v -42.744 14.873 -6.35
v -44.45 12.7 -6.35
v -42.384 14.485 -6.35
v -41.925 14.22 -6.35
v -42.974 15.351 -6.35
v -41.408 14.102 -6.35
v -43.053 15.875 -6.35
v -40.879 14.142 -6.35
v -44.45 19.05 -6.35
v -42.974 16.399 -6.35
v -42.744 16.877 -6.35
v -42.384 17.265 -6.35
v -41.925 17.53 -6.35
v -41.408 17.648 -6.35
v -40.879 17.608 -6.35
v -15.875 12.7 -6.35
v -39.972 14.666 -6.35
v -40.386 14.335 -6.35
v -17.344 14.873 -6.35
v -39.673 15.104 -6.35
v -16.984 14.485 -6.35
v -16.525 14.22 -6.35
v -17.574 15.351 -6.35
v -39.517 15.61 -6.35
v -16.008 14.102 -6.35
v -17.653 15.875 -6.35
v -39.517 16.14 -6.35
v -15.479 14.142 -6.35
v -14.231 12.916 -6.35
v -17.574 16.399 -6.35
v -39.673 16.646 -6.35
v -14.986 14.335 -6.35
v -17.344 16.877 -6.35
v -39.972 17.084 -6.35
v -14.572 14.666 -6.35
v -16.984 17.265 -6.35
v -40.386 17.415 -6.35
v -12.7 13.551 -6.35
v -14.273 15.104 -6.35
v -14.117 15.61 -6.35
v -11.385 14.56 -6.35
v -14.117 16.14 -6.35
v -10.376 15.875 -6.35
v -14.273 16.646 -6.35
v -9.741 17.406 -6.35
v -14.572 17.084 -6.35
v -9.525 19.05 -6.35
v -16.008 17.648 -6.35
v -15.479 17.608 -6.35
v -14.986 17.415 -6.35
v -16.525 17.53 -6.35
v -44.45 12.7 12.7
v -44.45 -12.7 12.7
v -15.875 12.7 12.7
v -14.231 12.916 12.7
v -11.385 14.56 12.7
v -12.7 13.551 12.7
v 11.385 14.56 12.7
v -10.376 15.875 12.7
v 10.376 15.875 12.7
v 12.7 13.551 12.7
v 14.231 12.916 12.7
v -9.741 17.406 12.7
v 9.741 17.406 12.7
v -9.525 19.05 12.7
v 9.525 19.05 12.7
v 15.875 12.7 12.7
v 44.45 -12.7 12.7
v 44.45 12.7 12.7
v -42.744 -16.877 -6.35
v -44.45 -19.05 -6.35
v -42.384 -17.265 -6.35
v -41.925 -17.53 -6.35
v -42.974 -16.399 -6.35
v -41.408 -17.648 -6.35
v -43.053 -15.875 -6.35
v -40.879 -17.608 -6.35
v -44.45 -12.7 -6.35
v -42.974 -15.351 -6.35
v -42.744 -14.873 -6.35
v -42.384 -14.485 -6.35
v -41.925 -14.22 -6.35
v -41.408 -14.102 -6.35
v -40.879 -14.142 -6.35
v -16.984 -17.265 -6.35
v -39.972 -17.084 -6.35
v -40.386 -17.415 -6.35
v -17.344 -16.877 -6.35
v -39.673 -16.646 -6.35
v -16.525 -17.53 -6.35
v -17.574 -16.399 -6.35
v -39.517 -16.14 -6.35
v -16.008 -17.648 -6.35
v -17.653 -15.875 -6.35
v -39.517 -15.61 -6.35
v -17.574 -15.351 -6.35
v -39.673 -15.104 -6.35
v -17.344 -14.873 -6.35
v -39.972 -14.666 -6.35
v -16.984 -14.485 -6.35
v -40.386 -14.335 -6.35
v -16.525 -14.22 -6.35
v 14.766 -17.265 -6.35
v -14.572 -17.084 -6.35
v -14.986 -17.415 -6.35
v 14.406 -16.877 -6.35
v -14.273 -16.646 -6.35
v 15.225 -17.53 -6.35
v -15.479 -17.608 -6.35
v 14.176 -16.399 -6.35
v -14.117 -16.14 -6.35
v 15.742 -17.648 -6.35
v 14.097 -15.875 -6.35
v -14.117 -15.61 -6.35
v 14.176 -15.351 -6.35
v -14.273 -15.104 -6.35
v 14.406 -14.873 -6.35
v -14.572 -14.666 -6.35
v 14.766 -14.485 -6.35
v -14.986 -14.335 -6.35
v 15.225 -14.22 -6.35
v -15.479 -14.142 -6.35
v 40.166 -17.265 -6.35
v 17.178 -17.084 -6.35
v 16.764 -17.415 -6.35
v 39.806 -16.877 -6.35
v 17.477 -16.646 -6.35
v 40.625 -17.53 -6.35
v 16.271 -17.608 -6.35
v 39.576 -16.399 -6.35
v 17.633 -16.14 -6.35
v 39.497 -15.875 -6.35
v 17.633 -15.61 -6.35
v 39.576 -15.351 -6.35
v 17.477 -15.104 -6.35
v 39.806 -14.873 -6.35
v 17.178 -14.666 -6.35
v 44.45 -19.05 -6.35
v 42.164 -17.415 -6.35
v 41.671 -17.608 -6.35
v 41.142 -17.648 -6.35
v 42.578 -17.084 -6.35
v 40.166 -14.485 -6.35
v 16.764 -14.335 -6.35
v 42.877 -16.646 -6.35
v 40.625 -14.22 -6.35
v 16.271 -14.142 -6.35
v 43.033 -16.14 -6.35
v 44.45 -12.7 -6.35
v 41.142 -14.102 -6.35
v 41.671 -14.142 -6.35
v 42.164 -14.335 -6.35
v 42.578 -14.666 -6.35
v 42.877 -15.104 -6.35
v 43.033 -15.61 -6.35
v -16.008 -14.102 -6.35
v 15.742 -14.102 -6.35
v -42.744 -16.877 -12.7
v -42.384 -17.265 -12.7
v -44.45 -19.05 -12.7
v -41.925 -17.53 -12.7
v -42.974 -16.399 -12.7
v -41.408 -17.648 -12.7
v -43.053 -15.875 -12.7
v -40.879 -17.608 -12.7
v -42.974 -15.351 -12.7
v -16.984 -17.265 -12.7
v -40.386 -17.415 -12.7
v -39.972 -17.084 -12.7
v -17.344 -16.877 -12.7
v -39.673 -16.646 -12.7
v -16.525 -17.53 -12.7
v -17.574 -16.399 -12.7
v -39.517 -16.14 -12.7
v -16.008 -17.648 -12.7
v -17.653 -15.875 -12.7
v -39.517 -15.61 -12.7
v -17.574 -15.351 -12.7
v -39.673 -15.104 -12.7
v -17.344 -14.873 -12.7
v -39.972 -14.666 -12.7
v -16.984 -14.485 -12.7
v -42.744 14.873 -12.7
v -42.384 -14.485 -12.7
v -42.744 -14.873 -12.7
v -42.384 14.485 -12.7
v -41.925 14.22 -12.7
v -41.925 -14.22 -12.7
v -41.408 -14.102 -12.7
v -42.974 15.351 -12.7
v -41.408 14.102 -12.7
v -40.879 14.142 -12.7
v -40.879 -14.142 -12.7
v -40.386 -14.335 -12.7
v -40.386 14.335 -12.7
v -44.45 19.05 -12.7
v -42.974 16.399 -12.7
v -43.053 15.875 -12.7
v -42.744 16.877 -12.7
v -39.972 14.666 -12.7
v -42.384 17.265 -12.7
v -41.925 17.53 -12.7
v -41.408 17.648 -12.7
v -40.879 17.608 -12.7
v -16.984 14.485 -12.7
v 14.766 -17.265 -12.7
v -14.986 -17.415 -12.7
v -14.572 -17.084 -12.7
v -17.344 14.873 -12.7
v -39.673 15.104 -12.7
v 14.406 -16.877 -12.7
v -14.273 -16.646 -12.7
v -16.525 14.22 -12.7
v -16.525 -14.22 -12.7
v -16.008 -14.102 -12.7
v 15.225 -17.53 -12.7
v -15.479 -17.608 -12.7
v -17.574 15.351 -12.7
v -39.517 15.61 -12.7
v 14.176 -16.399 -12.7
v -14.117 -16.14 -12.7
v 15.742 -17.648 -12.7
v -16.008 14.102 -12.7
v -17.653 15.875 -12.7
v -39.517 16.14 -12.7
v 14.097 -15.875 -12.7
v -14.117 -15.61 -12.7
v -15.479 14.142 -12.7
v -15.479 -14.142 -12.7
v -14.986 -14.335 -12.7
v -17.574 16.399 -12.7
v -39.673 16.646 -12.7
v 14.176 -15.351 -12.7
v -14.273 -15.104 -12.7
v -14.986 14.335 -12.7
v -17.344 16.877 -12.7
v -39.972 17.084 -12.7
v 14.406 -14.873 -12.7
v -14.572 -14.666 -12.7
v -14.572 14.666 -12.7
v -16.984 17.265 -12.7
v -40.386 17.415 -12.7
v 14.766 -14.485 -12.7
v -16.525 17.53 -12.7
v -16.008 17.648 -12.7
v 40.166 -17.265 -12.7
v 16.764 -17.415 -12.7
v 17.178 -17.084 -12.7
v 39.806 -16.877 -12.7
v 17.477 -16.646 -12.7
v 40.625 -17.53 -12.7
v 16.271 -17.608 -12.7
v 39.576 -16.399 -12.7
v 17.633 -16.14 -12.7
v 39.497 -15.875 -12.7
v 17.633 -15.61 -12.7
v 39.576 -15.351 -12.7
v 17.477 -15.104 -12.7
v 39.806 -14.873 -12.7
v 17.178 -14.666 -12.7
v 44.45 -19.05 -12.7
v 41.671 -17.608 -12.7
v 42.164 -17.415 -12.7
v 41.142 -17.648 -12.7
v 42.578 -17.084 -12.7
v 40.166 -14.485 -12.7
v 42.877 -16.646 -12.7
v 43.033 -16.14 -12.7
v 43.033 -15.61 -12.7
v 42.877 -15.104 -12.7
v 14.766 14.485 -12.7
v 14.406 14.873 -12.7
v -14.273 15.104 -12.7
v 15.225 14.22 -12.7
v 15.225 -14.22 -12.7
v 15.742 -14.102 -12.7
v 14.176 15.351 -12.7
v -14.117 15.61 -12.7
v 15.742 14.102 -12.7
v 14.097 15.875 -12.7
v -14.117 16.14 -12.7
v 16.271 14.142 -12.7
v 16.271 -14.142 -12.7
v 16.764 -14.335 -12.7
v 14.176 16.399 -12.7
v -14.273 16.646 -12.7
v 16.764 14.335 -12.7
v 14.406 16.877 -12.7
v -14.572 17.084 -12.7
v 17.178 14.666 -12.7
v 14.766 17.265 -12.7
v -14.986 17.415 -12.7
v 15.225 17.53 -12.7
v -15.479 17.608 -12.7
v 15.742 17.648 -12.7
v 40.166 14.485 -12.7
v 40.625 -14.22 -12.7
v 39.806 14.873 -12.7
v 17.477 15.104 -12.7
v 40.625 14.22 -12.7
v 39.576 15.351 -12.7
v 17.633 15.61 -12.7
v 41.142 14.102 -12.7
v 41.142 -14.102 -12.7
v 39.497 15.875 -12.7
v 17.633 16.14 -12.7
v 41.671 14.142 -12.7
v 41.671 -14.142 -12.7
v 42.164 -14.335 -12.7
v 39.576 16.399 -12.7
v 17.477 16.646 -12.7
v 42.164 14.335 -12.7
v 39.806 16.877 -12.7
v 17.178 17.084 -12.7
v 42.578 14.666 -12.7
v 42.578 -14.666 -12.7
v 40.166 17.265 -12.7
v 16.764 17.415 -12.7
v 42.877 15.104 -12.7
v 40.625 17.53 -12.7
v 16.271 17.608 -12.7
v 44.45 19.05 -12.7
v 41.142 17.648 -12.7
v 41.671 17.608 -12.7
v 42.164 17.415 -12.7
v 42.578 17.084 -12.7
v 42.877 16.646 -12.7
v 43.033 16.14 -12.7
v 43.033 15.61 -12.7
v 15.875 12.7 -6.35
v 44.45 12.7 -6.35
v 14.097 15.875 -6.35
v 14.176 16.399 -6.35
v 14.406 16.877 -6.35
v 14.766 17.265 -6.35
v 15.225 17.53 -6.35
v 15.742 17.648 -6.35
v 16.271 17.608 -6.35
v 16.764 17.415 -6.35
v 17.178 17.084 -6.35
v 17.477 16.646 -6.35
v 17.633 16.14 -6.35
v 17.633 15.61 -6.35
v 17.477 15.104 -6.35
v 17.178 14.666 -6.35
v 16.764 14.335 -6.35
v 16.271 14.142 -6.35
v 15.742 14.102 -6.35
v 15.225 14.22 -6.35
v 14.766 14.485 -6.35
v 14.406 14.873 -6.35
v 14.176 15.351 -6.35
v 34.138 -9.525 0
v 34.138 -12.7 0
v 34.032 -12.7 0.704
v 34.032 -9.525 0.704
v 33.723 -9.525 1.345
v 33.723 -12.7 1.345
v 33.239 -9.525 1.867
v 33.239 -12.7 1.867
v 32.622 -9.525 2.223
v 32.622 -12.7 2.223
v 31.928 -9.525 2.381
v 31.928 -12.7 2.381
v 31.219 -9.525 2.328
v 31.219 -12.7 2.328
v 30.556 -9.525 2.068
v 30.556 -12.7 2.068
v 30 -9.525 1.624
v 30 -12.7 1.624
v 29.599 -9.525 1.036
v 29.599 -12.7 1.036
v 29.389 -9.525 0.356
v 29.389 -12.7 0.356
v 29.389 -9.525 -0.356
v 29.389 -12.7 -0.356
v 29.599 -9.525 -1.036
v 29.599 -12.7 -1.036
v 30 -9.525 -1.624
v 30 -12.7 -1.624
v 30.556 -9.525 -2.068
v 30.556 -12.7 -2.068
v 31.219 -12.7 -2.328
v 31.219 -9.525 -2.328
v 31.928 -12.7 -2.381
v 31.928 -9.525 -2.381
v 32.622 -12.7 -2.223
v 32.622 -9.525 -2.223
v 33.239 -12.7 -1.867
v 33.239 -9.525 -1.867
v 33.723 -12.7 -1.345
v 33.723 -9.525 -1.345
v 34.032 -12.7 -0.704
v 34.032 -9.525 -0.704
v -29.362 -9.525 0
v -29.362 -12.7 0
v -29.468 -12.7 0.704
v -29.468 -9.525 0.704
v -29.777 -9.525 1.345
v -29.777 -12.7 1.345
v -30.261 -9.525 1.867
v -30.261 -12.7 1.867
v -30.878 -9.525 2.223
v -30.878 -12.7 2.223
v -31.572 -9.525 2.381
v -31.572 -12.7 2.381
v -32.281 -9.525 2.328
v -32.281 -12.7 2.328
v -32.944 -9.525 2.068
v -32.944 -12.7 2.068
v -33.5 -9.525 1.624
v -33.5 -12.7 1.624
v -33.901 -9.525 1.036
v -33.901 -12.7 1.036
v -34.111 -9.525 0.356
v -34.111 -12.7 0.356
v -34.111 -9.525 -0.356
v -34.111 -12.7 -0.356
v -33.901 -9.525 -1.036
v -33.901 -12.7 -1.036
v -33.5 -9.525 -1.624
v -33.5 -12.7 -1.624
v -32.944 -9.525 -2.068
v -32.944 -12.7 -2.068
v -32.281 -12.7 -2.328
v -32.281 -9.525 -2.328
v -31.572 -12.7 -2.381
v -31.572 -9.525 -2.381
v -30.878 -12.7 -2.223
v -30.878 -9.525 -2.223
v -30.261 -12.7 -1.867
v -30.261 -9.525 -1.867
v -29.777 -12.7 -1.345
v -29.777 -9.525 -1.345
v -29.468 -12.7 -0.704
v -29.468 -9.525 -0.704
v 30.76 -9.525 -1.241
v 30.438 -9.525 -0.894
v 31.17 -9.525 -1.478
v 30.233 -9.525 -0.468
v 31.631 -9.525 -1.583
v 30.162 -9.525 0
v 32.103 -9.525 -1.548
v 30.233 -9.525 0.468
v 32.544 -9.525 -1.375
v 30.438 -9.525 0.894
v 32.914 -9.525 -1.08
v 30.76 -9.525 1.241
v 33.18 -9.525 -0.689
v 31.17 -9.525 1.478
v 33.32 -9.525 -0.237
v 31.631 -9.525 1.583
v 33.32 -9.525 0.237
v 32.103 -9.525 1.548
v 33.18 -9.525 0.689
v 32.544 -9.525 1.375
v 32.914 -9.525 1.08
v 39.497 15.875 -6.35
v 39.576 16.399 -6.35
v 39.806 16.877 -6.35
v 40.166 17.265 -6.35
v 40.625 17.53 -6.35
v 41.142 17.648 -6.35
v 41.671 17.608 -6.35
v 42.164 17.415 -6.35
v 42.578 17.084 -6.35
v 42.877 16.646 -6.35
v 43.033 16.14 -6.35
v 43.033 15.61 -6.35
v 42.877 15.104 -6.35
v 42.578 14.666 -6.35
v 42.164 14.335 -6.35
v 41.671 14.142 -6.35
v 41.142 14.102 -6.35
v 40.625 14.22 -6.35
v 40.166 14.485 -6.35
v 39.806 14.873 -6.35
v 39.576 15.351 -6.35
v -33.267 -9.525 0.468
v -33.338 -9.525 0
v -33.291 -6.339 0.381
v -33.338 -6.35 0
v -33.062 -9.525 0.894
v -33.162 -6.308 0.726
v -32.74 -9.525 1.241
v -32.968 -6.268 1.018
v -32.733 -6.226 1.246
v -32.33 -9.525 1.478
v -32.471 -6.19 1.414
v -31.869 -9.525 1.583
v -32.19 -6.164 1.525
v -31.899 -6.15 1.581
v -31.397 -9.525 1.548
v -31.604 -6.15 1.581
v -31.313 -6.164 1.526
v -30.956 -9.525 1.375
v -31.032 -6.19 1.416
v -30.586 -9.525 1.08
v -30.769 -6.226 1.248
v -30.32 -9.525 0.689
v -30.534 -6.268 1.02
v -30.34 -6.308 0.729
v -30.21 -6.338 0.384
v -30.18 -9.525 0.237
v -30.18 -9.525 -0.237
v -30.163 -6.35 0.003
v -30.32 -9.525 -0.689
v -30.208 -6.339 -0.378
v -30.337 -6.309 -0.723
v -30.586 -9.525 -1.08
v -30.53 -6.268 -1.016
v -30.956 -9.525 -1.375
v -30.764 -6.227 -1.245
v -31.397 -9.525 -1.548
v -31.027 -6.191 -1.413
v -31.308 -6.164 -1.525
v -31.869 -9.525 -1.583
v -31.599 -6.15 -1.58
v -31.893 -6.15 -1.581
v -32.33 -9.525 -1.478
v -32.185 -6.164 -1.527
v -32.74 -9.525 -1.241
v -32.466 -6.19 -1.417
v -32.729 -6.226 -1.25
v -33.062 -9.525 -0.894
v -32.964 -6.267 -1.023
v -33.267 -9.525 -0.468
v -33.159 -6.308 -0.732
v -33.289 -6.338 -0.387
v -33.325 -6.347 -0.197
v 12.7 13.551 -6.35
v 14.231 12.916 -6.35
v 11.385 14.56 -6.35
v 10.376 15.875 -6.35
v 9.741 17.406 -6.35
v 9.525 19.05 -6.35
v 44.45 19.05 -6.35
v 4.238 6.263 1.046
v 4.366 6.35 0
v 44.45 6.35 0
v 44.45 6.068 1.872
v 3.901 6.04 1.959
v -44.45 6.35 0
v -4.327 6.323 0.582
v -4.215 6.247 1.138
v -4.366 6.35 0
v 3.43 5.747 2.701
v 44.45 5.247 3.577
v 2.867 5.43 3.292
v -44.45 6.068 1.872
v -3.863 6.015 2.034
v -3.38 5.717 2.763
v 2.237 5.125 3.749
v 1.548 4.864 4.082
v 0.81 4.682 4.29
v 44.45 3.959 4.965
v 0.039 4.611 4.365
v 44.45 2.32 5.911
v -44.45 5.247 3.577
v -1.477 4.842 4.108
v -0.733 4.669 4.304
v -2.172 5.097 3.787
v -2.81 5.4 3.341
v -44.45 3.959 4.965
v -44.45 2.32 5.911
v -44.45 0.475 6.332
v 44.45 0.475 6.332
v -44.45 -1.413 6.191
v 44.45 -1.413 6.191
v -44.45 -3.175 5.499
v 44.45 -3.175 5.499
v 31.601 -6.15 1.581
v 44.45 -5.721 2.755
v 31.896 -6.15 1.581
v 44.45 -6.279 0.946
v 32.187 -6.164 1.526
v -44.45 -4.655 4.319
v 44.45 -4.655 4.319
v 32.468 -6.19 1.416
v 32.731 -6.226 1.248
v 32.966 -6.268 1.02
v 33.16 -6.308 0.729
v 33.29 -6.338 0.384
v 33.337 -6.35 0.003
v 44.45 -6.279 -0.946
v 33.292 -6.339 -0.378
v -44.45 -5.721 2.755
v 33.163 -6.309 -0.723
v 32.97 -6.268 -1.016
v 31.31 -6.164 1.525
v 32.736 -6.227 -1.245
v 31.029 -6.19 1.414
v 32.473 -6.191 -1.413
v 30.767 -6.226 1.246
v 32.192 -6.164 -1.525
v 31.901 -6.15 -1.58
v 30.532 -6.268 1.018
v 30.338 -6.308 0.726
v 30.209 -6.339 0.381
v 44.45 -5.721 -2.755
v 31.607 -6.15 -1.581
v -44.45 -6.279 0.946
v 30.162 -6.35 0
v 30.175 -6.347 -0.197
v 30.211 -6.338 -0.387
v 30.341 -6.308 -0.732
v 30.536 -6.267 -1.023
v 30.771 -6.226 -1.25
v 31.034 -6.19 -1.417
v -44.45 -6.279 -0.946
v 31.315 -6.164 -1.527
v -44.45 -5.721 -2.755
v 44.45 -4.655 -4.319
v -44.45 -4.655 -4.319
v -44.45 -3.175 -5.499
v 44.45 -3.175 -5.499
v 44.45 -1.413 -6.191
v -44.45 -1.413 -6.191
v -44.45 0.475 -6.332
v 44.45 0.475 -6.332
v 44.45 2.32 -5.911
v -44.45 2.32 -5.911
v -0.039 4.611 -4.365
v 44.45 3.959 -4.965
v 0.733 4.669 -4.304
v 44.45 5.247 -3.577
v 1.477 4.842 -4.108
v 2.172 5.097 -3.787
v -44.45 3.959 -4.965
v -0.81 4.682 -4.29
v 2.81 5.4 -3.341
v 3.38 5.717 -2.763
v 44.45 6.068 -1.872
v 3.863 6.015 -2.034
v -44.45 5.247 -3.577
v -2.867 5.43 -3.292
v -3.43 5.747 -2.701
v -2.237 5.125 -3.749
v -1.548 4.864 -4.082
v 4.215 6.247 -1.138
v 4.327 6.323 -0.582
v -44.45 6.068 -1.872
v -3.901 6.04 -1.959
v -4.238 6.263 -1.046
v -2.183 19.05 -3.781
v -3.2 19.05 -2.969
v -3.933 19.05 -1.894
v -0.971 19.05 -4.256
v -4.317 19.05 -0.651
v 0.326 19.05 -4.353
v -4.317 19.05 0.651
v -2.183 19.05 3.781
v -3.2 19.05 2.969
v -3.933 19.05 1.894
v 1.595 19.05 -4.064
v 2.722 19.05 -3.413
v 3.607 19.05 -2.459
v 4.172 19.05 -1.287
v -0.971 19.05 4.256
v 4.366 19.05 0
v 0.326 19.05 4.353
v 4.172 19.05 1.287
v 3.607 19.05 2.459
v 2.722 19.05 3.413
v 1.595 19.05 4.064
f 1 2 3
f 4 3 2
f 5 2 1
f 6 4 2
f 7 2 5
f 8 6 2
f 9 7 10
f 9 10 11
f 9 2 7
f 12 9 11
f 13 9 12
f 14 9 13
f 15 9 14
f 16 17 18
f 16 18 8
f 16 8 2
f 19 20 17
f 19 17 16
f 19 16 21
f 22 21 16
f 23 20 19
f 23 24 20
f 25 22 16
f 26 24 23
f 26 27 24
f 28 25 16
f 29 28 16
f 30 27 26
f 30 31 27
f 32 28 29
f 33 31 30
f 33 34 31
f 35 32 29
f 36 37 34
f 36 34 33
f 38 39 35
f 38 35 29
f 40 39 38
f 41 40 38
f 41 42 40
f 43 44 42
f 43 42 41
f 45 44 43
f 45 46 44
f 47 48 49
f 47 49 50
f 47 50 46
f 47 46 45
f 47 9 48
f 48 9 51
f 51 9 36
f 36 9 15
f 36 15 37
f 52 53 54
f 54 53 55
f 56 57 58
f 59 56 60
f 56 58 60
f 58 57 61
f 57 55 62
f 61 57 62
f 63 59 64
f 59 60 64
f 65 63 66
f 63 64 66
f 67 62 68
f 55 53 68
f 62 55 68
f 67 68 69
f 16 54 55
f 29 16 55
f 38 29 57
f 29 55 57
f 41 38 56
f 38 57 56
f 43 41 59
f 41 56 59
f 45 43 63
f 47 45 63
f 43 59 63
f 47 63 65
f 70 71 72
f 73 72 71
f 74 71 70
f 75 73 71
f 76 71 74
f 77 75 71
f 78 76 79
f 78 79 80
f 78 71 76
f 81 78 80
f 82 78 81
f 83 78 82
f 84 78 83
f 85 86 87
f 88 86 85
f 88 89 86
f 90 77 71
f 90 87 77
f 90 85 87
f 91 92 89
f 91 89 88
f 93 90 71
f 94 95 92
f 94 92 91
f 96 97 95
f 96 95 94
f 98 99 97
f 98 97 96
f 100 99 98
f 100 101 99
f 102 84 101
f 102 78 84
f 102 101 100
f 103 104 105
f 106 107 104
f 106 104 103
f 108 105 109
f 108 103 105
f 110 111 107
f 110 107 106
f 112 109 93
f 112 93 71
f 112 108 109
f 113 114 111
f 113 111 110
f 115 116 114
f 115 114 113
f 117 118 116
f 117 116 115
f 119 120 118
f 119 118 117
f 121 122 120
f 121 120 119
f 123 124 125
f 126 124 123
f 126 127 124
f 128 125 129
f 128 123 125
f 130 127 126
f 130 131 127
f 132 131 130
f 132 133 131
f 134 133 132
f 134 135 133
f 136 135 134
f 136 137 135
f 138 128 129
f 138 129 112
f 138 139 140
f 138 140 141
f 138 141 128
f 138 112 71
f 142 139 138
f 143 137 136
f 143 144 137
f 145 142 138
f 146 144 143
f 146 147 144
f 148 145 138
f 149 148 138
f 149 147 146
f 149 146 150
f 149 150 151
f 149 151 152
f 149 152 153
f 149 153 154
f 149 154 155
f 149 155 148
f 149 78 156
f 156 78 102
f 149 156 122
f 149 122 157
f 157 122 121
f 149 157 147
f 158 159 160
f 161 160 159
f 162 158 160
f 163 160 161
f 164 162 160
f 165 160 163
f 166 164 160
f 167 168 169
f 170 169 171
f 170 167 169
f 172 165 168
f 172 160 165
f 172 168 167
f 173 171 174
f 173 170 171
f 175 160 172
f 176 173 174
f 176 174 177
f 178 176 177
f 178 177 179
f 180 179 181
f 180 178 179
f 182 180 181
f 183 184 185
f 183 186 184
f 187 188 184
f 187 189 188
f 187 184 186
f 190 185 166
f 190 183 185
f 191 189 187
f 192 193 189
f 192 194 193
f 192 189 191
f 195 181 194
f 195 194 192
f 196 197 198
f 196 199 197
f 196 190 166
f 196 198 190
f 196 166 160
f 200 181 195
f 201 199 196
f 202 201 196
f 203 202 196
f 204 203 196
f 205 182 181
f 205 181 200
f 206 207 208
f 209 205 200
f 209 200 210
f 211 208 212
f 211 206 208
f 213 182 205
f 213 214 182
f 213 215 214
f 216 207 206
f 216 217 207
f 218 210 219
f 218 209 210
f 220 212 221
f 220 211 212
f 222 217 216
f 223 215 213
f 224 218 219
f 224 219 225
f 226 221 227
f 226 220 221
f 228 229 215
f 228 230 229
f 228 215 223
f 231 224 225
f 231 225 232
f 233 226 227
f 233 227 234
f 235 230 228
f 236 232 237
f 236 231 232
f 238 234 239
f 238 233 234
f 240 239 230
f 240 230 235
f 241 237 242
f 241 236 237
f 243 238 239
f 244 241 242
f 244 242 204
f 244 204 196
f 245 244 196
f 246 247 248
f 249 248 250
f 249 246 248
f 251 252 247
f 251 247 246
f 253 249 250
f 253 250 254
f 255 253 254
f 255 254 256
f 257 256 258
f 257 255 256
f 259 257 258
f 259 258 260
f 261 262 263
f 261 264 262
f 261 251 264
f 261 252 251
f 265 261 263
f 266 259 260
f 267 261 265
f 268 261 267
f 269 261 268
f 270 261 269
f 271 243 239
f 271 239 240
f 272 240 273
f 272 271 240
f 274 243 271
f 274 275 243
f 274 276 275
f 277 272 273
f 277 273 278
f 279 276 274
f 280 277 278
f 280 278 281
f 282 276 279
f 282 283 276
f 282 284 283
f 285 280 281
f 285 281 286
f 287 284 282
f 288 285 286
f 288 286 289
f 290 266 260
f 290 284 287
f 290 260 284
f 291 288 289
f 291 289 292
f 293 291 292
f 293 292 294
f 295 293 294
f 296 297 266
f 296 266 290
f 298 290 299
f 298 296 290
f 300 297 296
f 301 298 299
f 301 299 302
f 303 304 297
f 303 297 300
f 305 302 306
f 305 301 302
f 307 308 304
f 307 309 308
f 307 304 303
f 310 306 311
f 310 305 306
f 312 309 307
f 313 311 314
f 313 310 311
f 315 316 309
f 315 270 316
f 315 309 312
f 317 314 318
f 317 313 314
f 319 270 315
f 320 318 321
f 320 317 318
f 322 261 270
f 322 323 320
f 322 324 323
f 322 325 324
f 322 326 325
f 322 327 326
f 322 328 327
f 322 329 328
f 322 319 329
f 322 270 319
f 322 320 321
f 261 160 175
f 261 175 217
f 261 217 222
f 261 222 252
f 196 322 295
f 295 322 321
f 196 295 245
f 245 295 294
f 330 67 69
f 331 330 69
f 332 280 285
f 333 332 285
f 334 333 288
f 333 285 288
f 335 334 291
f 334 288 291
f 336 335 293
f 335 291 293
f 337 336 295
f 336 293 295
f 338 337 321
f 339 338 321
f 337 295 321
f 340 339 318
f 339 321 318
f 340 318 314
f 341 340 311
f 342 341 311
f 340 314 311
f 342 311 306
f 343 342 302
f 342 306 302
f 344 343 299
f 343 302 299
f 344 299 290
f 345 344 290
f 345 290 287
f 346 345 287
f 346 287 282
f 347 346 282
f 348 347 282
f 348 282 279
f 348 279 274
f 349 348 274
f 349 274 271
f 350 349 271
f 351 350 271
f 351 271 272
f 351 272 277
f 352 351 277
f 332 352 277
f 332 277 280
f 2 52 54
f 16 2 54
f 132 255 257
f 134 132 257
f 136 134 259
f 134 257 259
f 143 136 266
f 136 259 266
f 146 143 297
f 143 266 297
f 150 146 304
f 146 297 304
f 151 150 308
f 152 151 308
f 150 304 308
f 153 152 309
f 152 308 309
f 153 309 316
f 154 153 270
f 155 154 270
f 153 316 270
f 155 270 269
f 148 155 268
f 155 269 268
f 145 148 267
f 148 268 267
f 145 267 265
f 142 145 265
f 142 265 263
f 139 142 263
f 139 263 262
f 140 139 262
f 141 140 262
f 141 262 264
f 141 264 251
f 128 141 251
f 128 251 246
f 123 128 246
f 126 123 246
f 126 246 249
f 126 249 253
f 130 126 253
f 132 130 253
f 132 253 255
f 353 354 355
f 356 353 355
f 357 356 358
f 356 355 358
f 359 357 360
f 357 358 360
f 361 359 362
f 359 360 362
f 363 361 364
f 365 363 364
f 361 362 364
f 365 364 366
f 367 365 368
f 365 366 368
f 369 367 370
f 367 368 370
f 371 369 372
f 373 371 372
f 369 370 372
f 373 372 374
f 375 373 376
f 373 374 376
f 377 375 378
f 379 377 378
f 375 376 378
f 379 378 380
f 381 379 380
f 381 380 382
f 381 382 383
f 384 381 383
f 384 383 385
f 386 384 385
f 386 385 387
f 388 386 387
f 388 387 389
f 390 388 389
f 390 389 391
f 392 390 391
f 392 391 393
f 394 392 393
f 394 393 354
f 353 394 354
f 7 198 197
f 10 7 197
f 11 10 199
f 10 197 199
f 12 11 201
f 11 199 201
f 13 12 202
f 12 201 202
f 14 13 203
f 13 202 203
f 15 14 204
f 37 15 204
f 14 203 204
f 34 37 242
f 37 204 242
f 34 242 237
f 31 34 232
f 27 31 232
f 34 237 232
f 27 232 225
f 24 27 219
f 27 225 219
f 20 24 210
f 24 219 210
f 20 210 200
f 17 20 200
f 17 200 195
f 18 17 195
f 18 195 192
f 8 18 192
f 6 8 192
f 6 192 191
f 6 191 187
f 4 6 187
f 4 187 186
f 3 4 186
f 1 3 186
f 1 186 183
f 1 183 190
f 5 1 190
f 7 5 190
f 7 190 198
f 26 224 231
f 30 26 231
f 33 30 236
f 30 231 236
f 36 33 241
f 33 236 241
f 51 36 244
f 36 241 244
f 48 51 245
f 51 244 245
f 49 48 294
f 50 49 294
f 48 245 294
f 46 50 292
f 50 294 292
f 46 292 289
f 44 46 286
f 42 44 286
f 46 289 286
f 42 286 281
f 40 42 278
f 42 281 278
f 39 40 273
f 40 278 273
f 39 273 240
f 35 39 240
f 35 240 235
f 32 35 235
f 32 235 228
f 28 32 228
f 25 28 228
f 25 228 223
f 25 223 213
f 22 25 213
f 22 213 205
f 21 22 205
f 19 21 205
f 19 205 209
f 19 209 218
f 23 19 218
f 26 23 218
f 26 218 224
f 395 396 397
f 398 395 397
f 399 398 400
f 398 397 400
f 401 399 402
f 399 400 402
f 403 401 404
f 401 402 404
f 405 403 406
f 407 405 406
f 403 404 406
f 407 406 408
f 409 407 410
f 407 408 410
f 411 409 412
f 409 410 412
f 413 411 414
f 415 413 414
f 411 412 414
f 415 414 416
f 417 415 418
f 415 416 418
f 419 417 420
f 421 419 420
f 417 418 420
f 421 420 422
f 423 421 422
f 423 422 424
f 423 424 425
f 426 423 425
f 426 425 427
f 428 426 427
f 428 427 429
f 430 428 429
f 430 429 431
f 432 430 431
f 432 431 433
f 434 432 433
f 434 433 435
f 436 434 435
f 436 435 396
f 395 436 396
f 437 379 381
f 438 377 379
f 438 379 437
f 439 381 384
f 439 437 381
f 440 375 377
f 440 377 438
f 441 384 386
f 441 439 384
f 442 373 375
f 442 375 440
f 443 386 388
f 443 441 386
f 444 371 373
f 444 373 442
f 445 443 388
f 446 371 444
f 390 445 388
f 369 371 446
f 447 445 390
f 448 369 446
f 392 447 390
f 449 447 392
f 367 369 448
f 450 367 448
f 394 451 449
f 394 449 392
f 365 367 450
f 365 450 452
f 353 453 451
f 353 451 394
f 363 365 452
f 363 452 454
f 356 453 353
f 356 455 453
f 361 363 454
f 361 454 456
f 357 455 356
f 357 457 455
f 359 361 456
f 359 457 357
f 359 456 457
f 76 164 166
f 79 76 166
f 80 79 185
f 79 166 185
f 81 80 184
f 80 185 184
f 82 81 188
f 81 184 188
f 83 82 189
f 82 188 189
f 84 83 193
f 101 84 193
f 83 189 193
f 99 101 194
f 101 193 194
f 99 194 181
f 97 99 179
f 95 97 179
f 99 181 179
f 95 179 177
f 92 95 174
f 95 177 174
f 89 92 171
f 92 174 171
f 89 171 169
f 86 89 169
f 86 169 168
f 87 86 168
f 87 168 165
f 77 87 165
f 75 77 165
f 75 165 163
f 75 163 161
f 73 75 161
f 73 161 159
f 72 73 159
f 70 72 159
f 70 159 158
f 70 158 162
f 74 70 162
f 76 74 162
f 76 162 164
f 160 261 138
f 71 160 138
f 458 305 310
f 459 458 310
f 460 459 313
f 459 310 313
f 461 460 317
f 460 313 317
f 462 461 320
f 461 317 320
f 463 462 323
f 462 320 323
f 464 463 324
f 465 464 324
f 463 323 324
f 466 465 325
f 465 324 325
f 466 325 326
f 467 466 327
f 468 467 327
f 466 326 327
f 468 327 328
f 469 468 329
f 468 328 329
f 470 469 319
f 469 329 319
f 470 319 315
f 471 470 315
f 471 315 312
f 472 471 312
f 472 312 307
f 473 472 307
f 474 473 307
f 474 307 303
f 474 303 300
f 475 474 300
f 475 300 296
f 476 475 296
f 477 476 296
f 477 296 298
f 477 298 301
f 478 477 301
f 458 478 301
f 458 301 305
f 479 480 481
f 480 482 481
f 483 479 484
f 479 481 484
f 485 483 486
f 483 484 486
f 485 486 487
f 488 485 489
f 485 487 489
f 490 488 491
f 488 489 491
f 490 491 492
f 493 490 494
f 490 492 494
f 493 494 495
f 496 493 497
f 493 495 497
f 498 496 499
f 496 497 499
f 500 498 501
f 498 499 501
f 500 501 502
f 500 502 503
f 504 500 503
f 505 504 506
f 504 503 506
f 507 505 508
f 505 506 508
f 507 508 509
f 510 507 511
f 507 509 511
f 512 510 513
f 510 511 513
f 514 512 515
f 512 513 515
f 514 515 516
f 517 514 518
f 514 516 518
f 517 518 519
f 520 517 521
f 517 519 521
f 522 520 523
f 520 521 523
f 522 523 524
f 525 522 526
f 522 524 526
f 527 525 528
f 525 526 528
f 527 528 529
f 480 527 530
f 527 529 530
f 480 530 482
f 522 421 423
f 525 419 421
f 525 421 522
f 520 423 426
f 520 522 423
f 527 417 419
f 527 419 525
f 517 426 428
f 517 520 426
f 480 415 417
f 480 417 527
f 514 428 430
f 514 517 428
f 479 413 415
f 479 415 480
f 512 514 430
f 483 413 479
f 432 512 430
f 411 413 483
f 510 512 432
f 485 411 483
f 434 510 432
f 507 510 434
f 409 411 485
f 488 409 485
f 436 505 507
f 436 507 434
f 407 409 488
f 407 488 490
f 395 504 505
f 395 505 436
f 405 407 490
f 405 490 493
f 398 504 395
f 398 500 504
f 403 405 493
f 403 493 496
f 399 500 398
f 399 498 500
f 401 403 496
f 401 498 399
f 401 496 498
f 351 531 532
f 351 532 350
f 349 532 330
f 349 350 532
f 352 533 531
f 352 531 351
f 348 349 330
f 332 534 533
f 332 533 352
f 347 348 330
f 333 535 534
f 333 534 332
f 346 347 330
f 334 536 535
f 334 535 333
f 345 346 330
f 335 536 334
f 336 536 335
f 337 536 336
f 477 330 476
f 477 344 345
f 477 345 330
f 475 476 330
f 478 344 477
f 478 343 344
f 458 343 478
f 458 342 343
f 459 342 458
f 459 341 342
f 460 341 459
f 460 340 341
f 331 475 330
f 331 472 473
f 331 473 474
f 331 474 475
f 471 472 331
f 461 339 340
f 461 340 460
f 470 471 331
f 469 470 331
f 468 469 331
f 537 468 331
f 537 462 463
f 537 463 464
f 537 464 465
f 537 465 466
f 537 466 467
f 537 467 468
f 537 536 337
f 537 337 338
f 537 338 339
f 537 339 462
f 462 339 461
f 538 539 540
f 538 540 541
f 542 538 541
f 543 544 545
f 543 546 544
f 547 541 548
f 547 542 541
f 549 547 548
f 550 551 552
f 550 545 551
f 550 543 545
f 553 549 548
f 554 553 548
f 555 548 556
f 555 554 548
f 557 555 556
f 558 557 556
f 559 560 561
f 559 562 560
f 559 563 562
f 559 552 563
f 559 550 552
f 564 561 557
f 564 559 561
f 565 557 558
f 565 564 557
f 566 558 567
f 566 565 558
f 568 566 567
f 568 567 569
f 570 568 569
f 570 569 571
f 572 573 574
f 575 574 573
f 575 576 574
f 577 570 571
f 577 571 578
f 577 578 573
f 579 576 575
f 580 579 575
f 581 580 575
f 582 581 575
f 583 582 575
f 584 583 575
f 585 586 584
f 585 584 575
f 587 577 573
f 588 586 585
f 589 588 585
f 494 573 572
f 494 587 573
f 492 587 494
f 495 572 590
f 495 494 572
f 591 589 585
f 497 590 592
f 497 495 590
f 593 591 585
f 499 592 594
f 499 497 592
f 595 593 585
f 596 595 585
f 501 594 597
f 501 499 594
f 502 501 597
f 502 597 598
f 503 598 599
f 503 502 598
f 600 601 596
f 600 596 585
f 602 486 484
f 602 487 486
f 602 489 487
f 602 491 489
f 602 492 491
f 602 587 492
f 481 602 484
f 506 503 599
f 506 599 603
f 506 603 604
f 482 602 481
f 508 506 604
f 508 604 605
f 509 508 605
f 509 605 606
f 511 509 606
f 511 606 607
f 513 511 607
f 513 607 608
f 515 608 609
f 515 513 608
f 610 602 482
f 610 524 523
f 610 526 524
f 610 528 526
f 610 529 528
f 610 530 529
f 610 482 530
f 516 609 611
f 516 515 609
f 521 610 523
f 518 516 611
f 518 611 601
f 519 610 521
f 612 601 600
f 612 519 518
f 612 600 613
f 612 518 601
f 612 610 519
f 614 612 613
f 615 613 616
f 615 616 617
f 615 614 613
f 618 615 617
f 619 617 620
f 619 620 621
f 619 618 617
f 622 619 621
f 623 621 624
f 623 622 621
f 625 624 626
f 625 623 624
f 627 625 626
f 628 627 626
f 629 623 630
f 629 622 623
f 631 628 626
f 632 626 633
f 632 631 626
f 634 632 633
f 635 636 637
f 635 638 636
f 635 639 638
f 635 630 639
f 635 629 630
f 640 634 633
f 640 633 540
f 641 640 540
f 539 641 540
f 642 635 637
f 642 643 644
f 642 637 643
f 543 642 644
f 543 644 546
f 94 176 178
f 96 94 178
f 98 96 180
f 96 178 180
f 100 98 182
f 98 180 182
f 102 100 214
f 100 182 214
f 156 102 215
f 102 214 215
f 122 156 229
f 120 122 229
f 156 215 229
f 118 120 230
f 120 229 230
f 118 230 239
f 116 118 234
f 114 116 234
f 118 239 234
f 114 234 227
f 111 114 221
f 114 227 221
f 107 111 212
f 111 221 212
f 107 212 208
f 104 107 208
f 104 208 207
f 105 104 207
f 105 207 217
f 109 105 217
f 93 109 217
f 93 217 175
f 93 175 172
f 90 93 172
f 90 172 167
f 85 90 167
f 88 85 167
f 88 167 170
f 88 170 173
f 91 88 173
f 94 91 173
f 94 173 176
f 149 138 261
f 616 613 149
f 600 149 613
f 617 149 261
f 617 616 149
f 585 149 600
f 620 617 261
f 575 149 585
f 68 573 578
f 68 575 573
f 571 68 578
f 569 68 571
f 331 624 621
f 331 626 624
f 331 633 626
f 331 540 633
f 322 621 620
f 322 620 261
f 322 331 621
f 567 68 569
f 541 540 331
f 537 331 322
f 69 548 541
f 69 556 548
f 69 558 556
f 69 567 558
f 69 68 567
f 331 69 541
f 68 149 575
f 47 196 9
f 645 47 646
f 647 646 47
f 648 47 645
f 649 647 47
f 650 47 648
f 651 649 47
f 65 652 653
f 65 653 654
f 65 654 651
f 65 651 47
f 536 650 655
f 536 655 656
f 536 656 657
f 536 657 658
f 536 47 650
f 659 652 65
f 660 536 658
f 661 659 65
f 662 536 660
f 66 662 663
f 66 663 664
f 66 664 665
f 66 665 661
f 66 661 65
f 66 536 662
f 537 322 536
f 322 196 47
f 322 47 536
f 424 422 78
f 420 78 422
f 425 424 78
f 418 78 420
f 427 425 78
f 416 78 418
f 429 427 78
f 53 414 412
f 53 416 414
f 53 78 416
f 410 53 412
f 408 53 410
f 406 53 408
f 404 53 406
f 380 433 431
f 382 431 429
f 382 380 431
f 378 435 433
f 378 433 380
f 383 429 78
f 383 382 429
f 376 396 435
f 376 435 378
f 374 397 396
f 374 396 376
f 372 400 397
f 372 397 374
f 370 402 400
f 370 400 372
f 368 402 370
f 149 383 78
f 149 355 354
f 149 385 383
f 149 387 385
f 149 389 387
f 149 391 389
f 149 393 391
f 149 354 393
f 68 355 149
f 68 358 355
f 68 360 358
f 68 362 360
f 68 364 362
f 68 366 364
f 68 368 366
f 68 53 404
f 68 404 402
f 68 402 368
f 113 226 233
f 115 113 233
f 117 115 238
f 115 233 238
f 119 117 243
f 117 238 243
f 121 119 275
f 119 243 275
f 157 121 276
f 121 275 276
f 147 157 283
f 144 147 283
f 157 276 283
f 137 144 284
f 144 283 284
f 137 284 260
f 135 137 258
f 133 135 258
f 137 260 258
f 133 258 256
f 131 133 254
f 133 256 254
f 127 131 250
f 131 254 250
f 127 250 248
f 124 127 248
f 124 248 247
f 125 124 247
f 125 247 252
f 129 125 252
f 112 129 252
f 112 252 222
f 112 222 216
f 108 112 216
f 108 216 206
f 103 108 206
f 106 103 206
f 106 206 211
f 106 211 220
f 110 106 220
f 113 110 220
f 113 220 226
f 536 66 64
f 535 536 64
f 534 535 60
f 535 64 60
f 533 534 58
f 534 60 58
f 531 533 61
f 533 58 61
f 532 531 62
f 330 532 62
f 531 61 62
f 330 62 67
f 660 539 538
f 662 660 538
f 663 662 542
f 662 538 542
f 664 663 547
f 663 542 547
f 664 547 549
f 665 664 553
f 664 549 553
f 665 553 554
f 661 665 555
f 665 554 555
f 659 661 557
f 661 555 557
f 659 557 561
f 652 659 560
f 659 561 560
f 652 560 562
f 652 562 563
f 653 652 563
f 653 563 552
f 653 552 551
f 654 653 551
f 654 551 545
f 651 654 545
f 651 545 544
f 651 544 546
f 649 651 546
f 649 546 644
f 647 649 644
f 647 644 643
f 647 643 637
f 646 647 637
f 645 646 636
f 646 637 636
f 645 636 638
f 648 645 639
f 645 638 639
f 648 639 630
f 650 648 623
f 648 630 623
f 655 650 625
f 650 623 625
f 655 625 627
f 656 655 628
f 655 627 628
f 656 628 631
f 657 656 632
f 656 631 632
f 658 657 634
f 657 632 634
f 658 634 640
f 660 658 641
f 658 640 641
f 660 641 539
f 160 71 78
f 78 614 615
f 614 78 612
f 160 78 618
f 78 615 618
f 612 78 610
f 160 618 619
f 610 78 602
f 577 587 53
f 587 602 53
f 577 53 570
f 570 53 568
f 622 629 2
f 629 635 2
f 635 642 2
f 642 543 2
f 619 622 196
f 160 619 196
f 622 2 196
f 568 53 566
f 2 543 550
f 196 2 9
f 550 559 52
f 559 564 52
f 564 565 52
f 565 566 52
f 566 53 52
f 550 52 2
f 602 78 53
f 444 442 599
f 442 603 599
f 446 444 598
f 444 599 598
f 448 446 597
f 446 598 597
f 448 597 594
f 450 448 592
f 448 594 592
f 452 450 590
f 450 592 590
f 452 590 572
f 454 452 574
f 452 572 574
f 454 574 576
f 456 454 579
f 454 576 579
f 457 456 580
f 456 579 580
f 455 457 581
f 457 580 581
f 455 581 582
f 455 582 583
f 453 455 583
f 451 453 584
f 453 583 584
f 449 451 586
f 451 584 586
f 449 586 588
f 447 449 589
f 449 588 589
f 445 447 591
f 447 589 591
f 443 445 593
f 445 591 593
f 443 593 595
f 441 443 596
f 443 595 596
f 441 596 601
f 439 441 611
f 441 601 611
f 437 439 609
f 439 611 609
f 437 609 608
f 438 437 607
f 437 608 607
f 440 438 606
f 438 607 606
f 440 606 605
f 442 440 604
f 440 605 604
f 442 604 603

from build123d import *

# Parameters (mm, degrees)
F0_W           = 38.1
F0_H           = 25.4
F0_R           = 6.35
F1_DEPTH       = 44.45
F2_W           = 88.9
F2_H           = 6.35
F3_DEPTH       = 19.05
F5_D           = 8.73125
F5_DEPTH       = 19.05
F5_TIP         = 2.6231321399
F7_D           = 3.175
F7_DEPTH       = 12.7
F7_CBORE_D     = 4.7752
F7_CBORE_DEPTH = 3.175
F7_TIP         = 0.9538662327
F9_D           = 3.556


with BuildPart() as f1:
    # F0 (on Right) → F1 (new body, symmetric)
    with BuildSketch(Plane.YZ):
        Rectangle(F0_W, F0_H)
        Circle(F0_R, mode=Mode.SUBTRACT)
    extrude(amount=F1_DEPTH, both=True)

    # F2 (on face) → F3 (cut)
    with BuildSketch(Plane.XY.offset(12.7)):
        with BuildLine():
            Line((-9.525, 19.05), (-44.45, 19.05))
            Line((-44.45, 19.05), (-44.45, 12.7))
            Line((-44.45, 12.7), (-15.875, 12.7))
            ThreePointArc((-15.875, 12.7), (-11.3848719395, 14.5598719395), (-9.525, 19.05))
        make_face()
        with BuildLine():
            Line((44.45, 12.7), (44.45, 19.05))
            Line((44.45, 19.05), (9.525, 19.05))
            ThreePointArc((9.525, 19.05), (11.3848719395, 14.5598719395), (15.875, 12.7))
            Line((15.875, 12.7), (44.45, 12.7))
        make_face()
        with Locations((0, -15.875)):
            Rectangle(F2_W, F2_H)
    extrude(amount=-F3_DEPTH, mode=Mode.SUBTRACT)

    # F5
    with Locations(Plane(origin=(0, 19.05, 0), x_dir=(-1, 0, 0), z_dir=(0, 1, 0))):
        with Locations((0, 0)):
            Hole(F5_D / 2, depth=F5_DEPTH)
            with Locations((0, 0, -(F5_DEPTH + F5_TIP / 2))):  # 118° drill point
                Cone(0, F5_D / 2, F5_TIP, mode=Mode.SUBTRACT)

    # F7
    with Locations(Plane.XZ.offset(12.7)):
        with Locations((-31.75, 0), (31.75, 0)):
            CounterBoreHole(F7_D / 2, F7_CBORE_D / 2, F7_CBORE_DEPTH, depth=F7_DEPTH)
            with Locations((0, 0, -(F7_DEPTH + F7_TIP / 2))):  # 118° drill point
                Cone(0, F7_D / 2, F7_TIP, mode=Mode.SUBTRACT)

    # F9 (through all)
    with Locations(Plane.XY.offset(-6.35)):
        with Locations((-41.275, 15.875), (-15.875, 15.875), (15.875, 15.875), (41.275, 15.875), (41.275, -15.875), (15.875, -15.875), (-15.875, -15.875), (-41.275, -15.875)):
            Hole(F9_D / 2)


solid = f1.part
